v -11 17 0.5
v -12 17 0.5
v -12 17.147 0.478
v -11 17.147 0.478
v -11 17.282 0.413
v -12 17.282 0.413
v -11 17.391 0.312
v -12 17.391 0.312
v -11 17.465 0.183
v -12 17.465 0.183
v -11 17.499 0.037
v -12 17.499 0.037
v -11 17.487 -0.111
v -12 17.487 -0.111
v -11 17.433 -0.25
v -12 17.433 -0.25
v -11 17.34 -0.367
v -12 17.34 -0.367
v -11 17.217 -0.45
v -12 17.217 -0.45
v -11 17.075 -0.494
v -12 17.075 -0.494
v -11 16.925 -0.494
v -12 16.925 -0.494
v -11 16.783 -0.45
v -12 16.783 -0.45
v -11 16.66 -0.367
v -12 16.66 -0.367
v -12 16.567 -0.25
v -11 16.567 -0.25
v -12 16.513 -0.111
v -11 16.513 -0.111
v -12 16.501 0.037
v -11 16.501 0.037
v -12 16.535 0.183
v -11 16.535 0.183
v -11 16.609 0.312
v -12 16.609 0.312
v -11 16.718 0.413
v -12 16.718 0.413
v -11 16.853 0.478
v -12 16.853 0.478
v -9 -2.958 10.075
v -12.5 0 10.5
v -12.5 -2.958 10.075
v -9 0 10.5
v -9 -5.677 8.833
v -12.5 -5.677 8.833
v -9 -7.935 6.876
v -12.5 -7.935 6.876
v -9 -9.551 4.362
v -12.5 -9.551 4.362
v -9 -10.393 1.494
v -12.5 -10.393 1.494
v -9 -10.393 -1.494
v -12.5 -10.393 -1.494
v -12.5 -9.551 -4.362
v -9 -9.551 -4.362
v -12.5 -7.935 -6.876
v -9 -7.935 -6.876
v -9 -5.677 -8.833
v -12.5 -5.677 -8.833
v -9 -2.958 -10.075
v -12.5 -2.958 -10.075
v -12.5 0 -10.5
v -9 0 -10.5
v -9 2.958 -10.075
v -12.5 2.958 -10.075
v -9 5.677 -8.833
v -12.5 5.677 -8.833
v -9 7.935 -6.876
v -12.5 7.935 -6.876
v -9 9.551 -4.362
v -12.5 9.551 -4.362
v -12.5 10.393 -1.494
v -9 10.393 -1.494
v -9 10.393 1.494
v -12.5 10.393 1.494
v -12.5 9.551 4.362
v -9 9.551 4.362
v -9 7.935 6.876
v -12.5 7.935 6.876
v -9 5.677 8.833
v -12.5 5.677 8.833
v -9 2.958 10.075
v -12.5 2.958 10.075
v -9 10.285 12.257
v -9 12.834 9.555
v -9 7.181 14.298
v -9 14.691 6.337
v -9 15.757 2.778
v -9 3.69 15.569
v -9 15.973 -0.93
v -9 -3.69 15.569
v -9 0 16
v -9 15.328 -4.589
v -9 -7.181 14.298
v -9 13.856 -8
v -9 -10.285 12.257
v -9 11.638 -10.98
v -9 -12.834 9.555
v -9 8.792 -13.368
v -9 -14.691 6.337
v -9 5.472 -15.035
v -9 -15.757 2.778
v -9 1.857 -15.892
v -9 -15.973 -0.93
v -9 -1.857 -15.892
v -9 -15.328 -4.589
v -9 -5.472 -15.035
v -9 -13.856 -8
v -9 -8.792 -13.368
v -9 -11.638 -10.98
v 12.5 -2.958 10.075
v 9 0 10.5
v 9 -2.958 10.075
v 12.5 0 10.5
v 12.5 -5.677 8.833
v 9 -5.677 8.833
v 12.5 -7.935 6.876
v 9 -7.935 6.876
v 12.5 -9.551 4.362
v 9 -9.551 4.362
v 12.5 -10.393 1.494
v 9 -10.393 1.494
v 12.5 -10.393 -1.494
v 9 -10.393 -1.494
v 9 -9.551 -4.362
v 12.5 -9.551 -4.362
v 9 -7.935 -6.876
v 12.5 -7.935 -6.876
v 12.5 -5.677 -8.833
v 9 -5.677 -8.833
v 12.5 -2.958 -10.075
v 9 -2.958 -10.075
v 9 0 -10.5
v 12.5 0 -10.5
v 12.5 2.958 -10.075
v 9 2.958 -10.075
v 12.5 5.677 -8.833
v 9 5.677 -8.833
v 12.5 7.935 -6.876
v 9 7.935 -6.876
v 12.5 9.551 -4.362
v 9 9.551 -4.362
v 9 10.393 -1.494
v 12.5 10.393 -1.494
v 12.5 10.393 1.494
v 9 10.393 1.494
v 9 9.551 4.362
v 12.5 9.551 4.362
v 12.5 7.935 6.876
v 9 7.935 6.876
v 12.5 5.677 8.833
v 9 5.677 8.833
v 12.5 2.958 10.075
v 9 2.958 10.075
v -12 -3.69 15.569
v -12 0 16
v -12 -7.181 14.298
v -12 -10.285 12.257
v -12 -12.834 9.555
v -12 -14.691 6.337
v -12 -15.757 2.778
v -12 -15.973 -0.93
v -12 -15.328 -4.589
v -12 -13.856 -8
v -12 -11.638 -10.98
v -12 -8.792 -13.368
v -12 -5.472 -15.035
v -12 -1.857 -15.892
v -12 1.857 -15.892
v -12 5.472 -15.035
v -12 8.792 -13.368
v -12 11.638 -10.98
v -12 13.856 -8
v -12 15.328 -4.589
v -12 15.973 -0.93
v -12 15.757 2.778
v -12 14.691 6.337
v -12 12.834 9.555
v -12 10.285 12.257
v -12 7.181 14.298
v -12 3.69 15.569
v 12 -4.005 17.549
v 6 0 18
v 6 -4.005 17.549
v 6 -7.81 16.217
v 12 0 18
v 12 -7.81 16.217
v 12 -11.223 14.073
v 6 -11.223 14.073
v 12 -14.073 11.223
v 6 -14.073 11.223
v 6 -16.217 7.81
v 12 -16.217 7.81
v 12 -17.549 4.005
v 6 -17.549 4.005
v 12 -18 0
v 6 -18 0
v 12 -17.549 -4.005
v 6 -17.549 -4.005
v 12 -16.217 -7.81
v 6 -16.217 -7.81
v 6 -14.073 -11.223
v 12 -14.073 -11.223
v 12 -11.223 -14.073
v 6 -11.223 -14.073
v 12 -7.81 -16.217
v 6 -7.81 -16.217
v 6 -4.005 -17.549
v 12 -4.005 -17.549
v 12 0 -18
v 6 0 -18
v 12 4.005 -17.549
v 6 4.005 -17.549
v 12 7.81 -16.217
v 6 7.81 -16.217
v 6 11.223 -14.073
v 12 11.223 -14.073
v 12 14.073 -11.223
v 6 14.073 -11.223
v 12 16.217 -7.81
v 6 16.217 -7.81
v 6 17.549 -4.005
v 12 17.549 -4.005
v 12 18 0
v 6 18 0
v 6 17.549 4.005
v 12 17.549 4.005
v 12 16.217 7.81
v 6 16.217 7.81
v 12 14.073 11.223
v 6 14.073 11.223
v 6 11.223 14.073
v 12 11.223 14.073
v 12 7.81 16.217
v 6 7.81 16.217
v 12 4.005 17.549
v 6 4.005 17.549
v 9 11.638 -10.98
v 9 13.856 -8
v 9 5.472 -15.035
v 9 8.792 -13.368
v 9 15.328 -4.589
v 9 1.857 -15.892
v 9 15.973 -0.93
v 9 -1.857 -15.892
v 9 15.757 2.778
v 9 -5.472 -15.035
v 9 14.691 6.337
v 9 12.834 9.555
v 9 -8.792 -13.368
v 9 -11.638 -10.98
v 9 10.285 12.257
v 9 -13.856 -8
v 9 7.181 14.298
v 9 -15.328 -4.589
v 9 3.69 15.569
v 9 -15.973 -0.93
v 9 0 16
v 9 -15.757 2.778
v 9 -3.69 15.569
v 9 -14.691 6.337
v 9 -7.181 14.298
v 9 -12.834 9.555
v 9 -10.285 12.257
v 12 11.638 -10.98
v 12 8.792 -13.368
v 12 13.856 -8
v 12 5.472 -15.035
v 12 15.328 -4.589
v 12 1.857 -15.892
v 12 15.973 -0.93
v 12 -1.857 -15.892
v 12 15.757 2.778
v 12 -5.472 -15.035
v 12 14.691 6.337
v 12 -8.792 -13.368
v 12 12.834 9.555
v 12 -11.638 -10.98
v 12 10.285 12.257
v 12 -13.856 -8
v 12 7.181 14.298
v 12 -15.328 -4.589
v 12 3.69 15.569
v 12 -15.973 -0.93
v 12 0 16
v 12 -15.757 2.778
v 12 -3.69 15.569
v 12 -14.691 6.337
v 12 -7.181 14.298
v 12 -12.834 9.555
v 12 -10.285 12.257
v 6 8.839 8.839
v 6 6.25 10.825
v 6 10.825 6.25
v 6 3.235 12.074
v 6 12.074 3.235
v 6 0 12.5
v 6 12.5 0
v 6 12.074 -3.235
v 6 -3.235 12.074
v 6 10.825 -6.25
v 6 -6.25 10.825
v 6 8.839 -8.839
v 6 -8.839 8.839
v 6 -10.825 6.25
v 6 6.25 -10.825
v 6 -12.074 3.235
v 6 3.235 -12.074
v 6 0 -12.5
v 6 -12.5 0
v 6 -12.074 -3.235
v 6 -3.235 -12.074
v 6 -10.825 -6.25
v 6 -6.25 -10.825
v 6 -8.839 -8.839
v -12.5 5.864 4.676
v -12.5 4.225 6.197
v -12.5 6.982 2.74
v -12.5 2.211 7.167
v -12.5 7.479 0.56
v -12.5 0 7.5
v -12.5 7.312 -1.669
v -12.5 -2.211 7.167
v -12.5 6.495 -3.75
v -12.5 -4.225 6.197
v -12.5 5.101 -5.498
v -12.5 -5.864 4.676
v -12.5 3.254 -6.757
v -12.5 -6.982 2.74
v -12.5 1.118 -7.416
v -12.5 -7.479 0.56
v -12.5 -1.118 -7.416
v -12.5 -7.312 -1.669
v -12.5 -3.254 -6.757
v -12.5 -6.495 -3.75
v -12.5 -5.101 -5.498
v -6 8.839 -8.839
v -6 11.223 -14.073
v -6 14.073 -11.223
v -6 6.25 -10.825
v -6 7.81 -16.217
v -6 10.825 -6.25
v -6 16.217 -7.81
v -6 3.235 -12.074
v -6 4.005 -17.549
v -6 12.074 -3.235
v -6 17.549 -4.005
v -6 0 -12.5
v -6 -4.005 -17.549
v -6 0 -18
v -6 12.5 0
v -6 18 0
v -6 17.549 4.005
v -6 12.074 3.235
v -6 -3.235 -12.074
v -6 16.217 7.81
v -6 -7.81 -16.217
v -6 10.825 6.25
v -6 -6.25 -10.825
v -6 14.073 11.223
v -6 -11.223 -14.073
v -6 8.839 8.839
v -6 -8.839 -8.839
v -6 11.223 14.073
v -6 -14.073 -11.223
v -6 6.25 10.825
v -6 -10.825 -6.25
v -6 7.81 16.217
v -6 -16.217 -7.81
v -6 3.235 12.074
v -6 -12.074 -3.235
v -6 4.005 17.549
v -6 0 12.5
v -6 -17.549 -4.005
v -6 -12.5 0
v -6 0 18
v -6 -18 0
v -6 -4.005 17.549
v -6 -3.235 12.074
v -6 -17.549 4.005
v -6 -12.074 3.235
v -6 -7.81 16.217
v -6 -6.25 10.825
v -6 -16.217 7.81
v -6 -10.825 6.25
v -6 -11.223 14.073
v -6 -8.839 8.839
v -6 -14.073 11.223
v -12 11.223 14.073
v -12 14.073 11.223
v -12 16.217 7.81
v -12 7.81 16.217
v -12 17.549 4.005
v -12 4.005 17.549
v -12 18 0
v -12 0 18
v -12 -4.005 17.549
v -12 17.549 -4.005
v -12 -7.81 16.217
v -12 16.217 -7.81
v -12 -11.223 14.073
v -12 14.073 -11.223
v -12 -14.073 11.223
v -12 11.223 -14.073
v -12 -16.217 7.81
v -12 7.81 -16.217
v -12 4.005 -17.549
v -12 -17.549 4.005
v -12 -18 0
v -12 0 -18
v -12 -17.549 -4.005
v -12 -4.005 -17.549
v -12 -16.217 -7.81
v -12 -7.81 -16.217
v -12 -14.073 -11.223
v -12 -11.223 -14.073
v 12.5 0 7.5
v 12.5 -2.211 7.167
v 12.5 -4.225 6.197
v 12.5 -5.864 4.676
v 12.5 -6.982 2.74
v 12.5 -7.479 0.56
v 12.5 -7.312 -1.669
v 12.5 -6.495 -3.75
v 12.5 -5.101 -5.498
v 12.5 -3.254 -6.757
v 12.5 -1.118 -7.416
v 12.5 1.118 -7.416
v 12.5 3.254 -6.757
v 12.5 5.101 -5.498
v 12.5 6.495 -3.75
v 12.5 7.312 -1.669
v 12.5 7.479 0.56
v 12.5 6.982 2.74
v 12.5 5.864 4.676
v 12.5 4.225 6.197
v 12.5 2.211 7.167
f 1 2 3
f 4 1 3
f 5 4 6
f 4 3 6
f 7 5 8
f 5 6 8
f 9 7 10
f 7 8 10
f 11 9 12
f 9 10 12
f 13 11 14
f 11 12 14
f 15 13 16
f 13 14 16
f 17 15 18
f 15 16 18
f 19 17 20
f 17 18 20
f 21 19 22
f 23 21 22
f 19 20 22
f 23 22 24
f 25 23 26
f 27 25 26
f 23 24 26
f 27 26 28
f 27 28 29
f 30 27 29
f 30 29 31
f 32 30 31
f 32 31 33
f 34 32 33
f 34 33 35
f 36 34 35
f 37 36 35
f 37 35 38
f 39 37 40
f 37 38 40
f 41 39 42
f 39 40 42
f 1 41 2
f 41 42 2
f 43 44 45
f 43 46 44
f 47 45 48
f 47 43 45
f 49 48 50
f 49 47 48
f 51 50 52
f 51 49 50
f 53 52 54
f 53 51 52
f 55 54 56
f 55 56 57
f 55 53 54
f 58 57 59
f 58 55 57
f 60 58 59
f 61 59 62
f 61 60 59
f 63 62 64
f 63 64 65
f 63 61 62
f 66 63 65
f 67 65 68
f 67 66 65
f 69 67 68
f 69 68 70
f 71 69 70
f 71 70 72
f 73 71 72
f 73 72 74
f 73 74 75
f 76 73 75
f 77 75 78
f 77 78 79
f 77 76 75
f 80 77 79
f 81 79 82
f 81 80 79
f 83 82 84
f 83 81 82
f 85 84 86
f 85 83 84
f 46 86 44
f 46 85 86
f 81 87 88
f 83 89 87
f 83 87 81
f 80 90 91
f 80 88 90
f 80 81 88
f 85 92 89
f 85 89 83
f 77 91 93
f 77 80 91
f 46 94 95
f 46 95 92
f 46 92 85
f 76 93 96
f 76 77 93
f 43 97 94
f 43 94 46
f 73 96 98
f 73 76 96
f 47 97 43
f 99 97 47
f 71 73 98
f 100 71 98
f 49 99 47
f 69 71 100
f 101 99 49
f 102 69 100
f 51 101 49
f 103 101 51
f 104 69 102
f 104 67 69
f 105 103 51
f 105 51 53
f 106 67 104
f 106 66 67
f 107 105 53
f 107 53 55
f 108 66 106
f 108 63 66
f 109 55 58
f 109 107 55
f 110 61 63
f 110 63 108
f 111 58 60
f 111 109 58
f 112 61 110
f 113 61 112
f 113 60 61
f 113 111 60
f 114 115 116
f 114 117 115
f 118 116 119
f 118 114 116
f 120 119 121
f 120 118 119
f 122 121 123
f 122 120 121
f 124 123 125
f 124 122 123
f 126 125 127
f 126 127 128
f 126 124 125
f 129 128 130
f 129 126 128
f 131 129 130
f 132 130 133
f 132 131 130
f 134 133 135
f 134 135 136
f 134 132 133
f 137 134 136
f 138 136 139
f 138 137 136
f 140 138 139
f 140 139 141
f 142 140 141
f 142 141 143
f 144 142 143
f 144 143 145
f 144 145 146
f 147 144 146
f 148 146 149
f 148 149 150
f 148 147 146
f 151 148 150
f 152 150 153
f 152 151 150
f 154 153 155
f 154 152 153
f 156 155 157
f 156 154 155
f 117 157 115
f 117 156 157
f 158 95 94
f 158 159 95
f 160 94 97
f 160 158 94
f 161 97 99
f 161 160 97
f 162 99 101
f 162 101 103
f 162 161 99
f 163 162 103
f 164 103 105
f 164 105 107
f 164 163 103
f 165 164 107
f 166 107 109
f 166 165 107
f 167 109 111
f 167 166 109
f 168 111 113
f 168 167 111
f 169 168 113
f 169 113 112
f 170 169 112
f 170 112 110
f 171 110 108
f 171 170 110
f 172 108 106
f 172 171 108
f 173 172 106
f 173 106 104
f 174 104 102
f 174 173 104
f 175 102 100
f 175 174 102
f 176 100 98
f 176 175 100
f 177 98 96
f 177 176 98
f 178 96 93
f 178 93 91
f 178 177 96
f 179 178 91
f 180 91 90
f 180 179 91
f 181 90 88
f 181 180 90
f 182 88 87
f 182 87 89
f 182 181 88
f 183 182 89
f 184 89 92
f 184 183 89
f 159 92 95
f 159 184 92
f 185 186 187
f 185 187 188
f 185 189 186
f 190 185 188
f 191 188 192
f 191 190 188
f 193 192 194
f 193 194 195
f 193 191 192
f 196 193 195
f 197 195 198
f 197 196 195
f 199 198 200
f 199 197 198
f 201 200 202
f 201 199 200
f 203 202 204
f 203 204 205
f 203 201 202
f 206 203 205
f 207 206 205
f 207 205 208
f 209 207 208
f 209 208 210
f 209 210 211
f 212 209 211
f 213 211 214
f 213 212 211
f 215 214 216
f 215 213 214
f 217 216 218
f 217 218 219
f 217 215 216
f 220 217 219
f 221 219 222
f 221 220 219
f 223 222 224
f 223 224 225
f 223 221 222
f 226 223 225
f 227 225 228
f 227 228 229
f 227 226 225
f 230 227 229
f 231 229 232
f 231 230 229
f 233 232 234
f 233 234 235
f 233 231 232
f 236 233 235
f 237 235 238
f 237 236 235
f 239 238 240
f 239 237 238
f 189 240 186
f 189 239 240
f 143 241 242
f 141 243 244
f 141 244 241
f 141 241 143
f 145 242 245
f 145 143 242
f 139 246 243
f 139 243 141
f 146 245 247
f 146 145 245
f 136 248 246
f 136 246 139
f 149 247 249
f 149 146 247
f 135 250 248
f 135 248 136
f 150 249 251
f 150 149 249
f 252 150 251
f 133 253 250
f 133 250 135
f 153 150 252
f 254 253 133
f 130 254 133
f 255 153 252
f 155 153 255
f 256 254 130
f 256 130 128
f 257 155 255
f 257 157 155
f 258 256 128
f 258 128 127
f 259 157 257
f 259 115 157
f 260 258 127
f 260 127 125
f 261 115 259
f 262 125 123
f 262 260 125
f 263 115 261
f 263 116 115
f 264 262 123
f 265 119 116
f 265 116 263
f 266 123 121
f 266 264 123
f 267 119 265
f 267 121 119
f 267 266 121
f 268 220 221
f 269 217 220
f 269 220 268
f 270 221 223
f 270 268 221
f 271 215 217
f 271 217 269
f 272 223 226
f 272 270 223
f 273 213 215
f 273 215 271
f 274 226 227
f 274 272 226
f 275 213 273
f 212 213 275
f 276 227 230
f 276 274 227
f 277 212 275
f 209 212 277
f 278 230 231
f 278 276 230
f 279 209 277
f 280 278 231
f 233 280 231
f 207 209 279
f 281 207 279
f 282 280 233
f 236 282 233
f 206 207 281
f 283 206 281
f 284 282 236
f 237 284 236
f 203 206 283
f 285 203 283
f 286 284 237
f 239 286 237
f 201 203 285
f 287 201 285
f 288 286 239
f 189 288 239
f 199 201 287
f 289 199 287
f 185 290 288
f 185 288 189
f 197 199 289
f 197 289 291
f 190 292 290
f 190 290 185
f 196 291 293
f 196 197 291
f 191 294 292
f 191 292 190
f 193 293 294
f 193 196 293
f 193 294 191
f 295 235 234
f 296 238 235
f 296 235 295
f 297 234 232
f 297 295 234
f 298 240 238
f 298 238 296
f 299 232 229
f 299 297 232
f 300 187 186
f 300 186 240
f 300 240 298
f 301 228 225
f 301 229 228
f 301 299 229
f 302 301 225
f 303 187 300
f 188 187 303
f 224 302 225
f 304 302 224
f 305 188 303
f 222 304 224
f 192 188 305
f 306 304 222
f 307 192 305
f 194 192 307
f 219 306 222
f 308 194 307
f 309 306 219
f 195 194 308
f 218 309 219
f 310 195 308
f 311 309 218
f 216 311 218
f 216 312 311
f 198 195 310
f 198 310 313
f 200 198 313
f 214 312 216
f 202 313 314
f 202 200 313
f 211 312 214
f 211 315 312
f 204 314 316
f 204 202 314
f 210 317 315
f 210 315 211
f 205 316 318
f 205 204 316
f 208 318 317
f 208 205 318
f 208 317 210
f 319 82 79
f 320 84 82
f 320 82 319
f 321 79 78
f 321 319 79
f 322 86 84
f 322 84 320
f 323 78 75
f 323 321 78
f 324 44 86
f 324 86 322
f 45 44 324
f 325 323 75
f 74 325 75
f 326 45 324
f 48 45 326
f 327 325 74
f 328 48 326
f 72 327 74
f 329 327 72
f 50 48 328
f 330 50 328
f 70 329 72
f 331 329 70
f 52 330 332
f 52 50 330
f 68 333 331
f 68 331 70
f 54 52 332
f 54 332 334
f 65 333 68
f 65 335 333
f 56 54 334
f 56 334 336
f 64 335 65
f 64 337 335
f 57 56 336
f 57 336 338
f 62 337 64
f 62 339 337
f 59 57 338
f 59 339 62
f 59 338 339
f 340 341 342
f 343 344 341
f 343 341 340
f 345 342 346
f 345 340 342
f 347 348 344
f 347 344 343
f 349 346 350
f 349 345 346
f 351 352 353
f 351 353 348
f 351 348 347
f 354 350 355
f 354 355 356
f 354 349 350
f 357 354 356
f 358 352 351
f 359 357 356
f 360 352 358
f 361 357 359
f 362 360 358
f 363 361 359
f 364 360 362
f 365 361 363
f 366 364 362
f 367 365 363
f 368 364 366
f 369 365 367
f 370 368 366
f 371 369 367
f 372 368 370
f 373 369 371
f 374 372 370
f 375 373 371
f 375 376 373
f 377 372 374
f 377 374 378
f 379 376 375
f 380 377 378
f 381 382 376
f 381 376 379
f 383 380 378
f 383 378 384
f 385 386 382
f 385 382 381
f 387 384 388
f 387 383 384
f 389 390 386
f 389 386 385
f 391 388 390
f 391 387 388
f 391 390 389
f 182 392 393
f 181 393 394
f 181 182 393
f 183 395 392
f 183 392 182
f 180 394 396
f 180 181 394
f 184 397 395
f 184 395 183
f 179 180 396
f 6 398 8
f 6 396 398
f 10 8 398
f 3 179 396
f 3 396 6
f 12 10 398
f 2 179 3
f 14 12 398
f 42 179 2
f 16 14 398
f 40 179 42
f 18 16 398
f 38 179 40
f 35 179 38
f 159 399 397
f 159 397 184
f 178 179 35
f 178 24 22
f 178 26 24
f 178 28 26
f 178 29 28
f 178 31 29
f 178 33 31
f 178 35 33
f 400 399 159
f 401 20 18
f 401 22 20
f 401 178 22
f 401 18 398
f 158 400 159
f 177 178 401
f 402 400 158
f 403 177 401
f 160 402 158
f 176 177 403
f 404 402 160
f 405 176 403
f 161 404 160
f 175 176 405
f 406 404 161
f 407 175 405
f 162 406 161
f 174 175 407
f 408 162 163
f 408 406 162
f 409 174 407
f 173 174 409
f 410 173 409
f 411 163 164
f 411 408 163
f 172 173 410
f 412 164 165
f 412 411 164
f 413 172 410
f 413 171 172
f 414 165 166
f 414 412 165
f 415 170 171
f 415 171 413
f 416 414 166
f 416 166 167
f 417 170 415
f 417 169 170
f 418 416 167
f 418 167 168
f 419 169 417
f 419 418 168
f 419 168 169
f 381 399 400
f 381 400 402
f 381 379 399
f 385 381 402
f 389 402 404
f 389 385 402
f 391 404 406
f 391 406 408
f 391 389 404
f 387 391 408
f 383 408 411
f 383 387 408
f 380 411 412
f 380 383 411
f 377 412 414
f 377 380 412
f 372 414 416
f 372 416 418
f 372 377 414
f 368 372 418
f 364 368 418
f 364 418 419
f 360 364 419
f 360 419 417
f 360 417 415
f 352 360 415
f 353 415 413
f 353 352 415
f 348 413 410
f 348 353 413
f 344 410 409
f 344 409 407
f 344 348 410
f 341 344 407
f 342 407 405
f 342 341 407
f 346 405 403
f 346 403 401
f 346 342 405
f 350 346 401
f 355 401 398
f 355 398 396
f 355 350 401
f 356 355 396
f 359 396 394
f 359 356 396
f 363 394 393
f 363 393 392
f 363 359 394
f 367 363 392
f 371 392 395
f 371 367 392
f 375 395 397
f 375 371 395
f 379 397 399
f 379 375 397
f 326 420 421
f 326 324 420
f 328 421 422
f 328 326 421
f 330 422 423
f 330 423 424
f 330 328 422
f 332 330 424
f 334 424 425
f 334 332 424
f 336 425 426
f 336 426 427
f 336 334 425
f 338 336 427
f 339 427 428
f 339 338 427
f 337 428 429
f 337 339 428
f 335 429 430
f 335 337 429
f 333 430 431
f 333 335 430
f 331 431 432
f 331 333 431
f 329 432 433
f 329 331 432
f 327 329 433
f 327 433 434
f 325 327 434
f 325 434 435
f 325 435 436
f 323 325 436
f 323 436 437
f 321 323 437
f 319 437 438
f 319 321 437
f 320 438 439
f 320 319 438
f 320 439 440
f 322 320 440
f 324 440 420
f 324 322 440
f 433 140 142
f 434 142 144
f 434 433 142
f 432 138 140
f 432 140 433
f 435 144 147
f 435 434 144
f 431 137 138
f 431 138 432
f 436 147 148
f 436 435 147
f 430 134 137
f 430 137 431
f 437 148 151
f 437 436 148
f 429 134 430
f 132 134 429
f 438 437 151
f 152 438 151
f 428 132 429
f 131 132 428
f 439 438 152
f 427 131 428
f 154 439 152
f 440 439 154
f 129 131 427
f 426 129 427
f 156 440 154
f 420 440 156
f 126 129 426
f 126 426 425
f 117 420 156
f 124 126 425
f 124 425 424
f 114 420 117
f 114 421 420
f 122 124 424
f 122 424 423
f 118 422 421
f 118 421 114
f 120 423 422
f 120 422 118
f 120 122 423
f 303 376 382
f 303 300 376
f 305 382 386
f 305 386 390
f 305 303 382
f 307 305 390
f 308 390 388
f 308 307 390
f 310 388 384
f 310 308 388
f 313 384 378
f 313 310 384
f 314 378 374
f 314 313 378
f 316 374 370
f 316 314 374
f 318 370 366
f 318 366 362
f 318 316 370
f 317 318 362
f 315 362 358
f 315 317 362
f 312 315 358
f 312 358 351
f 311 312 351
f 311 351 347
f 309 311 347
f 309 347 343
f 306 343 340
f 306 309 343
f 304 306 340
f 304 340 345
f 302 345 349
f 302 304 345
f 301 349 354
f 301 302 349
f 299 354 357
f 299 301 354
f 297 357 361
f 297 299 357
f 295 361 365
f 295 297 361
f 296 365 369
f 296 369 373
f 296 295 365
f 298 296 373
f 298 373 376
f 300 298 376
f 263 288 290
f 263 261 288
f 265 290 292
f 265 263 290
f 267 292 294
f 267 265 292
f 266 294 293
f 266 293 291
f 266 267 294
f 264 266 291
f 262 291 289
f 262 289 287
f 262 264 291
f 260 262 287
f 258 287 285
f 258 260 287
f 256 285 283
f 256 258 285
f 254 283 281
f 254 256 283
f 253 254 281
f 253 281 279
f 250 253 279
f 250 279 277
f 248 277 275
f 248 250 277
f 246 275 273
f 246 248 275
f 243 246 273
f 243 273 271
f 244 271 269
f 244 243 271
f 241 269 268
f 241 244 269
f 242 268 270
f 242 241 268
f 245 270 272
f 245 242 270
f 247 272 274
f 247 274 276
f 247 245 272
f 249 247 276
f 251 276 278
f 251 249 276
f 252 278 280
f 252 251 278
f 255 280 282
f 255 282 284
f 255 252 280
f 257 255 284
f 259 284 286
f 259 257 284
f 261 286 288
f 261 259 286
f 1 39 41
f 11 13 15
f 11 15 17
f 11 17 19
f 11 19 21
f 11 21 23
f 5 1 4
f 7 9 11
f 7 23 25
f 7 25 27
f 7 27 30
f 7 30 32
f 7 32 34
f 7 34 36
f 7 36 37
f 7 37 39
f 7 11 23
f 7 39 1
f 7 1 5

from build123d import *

# Parameters (mm, degrees)
SZKIC2_R                   = 0.5
WYTNIJ_WYCI_GNI_CIE1_DEPTH = 1


with BuildPart() as part:
    # Szkic1 → Obrót1 (revolve)
    with BuildSketch(Plane.XY, mode=Mode.PRIVATE) as obr_t1_sk:
        Polygon((-6, 12.5), (6, 12.5), (6, 18), (12, 18), (12, 16), (9, 16), (9, 10.5), (12.5, 10.5), (12.5, 7.5), (-12.5, 7.5), (-12.5, 10.5), (-9, 10.5), (-9, 16), (-12, 16), (-12, 18), (-6, 18), align=None)
    revolve(obr_t1_sk.sketch.rotate(Axis((-30.837457467, 0, 0), (1, 0, 0)), 90), axis=Axis((-30.837457467, 0, 0), (1, 0, 0)))

    # Szkic2 → Wytnij-wyciągnięcie1 (cut)
    with BuildSketch(Plane.ZY.offset(12)):
        with Locations((0, 17)):
            Circle(SZKIC2_R)
    extrude(amount=-WYTNIJ_WYCI_GNI_CIE1_DEPTH, mode=Mode.SUBTRACT)


solid = part.part
